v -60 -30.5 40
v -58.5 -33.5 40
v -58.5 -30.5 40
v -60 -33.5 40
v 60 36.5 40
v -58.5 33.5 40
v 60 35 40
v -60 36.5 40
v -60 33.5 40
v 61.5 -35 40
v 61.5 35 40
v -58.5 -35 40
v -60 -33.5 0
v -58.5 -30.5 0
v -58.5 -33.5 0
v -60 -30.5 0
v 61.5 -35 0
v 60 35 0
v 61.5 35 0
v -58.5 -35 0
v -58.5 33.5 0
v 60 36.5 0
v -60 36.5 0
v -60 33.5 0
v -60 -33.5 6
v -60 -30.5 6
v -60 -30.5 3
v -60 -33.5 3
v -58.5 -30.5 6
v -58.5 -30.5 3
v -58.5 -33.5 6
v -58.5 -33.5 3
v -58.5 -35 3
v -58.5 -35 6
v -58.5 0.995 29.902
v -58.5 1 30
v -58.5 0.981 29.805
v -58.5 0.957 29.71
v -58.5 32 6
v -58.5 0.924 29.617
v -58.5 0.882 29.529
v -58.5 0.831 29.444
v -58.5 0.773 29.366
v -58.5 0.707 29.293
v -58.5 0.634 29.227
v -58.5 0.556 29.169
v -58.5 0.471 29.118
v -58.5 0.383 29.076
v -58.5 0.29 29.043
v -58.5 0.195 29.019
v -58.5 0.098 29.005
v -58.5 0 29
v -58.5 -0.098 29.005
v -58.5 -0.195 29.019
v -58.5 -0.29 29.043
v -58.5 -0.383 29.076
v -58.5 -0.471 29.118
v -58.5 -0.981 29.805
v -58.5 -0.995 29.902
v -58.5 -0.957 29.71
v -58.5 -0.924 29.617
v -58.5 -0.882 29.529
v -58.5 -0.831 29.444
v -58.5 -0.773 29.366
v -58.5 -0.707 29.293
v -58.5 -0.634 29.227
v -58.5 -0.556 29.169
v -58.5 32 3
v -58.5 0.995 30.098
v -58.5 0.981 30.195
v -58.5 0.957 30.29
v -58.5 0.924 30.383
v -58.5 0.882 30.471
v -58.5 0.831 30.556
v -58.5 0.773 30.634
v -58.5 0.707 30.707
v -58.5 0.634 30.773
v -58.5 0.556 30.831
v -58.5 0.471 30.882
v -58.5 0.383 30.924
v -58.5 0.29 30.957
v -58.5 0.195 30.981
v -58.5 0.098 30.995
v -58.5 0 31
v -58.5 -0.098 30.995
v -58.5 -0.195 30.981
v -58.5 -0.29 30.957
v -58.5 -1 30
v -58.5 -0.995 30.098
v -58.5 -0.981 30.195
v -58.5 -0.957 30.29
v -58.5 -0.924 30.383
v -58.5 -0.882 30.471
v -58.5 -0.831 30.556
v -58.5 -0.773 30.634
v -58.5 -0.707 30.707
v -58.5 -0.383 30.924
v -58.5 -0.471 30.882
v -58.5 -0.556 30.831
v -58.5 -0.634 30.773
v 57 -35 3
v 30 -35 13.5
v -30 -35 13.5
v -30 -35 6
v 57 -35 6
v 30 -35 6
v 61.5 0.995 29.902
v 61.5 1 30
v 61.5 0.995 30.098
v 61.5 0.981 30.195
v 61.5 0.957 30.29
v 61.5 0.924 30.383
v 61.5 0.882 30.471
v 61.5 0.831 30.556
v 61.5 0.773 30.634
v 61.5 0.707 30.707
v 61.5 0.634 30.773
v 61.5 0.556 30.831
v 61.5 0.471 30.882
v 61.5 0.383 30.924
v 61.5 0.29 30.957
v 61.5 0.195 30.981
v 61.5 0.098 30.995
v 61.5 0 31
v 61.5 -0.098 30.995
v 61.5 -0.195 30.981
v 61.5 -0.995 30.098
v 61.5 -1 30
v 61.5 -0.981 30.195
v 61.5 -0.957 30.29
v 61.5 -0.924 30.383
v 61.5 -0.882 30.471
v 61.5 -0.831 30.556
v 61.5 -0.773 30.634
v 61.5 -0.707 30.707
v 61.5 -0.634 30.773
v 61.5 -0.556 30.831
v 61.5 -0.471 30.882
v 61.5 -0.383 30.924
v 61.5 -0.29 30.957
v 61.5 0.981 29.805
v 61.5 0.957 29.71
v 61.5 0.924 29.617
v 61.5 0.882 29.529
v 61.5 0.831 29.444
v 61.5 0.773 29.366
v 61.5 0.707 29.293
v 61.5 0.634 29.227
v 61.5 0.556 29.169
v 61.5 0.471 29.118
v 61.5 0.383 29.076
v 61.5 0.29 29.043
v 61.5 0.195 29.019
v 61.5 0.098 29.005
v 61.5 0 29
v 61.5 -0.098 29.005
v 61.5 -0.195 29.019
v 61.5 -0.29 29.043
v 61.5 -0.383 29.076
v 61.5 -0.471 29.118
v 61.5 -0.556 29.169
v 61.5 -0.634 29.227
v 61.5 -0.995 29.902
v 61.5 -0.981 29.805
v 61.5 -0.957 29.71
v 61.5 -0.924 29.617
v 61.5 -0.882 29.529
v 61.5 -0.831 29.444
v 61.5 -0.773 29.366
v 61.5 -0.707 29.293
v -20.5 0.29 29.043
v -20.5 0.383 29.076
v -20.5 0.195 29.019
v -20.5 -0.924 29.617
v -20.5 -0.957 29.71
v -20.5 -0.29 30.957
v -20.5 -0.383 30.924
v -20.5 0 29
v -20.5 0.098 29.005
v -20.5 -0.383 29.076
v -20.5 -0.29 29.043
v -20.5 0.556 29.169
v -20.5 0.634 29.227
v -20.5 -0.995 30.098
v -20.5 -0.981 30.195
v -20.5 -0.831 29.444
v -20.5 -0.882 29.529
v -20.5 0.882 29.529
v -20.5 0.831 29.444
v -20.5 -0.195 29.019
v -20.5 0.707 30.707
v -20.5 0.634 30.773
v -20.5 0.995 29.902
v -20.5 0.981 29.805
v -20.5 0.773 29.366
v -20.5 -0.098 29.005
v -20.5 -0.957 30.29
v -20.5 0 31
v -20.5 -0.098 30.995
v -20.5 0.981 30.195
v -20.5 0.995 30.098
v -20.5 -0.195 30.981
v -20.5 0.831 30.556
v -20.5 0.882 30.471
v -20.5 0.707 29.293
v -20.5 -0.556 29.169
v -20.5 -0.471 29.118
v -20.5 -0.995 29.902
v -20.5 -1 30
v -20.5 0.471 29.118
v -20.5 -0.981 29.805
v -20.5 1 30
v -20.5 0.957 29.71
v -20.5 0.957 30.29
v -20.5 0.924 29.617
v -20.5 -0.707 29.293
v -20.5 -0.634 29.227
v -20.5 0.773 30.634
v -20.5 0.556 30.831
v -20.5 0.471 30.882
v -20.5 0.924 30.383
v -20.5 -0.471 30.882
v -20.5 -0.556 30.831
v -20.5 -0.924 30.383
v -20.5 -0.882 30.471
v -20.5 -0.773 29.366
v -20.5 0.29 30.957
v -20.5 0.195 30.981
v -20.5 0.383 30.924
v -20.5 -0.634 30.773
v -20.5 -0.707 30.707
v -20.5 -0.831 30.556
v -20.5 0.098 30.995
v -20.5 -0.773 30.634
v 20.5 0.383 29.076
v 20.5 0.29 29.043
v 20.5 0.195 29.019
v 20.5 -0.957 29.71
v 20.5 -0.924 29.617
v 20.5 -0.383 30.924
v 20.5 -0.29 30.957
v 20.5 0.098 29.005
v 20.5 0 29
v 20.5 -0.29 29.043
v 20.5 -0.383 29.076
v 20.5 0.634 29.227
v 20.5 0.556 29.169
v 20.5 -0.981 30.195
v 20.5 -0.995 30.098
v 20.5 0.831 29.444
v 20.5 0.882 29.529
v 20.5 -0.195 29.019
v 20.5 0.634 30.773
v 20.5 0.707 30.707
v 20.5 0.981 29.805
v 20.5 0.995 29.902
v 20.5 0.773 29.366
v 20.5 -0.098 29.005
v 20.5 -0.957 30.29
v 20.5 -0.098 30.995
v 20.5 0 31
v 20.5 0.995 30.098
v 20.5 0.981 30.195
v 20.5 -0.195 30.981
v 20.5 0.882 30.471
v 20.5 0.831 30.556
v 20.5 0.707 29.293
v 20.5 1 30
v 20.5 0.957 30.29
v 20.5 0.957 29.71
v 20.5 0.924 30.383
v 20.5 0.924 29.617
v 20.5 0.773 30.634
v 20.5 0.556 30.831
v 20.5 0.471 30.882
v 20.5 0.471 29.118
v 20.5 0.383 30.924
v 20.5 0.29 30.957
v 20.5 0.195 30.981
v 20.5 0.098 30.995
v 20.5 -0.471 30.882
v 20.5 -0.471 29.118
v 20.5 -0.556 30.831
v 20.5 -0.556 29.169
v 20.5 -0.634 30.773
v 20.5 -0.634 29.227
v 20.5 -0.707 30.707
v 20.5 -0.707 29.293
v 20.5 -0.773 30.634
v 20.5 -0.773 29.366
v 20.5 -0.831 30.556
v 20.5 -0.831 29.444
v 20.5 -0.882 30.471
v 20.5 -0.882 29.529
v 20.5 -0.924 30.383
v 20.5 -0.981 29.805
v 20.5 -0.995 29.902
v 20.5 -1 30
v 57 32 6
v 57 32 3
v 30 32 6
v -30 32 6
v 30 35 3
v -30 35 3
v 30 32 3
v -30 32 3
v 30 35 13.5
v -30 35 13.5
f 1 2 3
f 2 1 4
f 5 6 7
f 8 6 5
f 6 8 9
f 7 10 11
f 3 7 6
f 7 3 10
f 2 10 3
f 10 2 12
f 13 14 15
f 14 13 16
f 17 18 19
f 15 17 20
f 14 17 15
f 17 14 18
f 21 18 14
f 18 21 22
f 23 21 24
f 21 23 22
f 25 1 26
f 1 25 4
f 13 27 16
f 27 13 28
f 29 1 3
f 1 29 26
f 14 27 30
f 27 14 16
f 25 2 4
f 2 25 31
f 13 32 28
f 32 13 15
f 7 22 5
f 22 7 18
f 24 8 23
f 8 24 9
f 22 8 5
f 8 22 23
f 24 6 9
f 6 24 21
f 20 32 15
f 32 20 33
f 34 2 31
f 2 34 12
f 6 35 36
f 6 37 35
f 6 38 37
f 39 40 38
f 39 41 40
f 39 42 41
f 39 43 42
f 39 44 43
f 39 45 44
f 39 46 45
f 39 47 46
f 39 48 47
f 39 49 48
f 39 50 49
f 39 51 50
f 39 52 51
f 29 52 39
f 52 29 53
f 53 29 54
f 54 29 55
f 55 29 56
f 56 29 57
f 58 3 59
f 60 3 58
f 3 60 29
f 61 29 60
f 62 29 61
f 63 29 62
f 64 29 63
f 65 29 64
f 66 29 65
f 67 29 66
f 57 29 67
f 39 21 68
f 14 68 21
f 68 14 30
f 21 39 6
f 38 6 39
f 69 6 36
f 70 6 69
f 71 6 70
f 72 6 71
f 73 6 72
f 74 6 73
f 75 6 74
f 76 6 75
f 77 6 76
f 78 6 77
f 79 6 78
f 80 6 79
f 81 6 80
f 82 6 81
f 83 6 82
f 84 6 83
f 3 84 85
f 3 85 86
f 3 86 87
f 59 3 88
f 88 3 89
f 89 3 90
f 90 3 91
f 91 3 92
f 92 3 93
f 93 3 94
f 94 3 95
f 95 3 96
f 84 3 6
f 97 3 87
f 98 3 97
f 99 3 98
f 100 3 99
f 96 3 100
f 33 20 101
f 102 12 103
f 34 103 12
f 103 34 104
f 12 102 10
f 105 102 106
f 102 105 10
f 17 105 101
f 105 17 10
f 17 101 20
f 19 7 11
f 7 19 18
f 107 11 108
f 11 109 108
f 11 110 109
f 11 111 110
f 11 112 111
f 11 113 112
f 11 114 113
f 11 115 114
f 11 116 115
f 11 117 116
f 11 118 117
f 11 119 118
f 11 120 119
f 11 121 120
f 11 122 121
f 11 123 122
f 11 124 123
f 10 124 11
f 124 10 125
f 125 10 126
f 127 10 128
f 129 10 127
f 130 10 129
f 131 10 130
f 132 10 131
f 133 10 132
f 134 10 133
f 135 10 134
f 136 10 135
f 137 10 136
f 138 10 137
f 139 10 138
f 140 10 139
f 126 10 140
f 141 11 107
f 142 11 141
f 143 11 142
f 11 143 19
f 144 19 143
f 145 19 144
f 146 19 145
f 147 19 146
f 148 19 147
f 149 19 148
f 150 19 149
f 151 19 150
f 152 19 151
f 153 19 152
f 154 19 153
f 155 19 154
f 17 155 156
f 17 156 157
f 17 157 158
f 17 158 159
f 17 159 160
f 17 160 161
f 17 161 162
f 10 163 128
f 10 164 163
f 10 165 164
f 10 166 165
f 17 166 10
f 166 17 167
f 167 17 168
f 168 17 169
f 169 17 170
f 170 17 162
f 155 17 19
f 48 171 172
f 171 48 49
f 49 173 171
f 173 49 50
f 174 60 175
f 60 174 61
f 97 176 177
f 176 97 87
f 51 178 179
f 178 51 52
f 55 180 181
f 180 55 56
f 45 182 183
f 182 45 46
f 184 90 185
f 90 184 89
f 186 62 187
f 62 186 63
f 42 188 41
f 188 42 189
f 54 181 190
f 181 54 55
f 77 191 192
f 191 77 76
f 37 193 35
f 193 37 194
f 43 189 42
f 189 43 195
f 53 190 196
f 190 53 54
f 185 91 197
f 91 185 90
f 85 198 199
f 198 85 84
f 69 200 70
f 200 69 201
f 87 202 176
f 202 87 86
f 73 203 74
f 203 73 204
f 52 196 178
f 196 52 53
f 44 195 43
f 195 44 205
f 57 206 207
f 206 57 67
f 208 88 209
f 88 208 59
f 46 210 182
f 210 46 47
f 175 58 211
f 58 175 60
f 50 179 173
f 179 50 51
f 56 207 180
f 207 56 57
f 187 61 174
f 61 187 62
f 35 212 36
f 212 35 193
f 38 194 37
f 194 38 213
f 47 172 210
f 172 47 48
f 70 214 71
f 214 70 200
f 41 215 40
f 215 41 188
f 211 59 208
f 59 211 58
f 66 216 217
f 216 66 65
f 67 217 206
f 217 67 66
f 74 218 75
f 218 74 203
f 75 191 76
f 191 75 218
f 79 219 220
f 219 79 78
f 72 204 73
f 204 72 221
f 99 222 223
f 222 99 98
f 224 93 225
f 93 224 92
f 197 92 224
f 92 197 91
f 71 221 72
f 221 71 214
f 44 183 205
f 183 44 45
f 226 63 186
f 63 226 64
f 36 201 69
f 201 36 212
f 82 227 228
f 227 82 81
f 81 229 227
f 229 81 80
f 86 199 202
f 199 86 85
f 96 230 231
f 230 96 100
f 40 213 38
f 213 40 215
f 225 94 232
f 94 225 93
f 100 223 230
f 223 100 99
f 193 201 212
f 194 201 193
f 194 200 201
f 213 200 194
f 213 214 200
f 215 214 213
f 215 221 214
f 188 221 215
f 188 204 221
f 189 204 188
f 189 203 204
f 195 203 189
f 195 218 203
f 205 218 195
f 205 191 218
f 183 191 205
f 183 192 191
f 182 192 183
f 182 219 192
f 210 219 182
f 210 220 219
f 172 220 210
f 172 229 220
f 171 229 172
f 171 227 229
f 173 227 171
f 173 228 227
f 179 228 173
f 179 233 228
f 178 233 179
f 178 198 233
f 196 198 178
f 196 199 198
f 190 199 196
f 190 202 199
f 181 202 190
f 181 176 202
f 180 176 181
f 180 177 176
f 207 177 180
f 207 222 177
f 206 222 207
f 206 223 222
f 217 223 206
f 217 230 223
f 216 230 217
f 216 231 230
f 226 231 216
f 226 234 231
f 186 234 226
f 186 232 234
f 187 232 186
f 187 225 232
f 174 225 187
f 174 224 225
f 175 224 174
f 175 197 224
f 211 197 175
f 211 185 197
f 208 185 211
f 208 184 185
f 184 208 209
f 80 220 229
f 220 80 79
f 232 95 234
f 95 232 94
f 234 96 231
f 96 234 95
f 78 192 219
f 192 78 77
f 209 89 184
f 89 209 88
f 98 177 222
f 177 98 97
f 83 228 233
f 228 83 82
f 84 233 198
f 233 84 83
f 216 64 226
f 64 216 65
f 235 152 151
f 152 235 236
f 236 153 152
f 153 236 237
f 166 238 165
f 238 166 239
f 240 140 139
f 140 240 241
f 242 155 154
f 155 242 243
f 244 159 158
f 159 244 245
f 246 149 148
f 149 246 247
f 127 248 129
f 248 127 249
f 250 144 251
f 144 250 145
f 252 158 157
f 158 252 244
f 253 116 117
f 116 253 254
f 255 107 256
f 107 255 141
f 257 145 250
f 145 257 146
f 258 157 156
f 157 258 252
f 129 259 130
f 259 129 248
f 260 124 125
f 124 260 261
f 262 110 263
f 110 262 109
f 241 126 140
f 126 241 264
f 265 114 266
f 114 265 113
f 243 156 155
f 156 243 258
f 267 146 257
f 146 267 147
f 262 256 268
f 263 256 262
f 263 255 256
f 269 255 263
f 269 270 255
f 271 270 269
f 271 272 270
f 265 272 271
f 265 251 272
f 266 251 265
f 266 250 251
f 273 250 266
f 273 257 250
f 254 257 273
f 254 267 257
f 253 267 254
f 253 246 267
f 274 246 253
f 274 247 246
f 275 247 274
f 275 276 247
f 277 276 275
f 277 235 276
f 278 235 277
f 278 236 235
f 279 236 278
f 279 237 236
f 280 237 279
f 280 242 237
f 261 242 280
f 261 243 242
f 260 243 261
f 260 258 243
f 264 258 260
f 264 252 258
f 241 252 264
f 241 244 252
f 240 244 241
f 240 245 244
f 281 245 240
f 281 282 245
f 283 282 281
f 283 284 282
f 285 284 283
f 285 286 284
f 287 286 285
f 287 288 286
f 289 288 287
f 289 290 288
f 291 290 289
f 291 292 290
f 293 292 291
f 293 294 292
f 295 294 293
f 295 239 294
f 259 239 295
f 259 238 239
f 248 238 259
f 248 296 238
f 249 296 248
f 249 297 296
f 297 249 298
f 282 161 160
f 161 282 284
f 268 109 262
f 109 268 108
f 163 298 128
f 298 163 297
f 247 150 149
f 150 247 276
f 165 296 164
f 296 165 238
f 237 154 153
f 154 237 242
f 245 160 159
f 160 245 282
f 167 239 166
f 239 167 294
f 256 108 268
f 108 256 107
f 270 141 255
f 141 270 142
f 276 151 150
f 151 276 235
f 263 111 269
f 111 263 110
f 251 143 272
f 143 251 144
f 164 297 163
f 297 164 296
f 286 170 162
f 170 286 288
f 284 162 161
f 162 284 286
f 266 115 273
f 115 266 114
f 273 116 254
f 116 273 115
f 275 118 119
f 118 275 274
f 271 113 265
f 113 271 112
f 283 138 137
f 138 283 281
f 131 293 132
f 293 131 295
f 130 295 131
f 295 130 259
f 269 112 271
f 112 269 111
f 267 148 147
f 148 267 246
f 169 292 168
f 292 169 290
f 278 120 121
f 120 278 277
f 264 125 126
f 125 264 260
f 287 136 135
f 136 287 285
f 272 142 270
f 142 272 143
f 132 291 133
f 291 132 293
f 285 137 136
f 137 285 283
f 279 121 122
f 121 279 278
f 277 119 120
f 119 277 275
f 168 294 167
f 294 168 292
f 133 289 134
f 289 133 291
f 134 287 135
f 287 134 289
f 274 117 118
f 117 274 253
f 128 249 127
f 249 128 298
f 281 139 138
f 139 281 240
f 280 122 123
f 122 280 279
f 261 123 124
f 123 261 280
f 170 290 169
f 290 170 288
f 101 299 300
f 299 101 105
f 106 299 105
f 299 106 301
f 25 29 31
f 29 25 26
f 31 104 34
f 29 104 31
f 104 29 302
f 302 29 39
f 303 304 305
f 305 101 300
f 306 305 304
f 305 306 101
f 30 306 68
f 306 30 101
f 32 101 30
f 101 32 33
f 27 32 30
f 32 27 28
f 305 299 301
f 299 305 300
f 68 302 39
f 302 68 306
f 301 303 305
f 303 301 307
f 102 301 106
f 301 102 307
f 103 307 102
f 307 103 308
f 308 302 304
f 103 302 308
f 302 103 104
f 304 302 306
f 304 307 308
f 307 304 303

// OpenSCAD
// Mini horizontal gel-electrophoresis buffer tank
// Print orientation: base on XY plane, open top facing +Z

$fn = 64;

// --- Tank dimensions ---
tank_x = 120;   // outer length (X)
tank_y = 70;    // outer width (Y)
tank_z = 40;    // outer height (Z)

// --- Walls and floor ---
wall = 3;       // wall thickness
floor = 3;      // floor thickness

// --- Gel tray platform ---
plat_x = 60;    // platform length in X
plat_top_z = 13; // top of platform (10 mm above inner floor)

// --- Electrode holes ---
hole_d = 2;     // hole diameter
hole_y = 0;     // hole Y position
hole_z = 30;    // hole Z position

// --- Cutting overlap ---
eps = 0.5;      // extension past cut faces

difference() {
    // Tank body
    union() {
        // Side walls and floor
        hull() {
            for (sx = [-1, 1]) {
                translate([sx * (tank_x / 2 - wall / 2), -tank_y / 2, 0])
                    cube([wall, tank_y, tank_z]);
            }
        }
        // End walls (overlap into side walls for a clean union)
        for (sy = [-1, 1])
            translate([-tank_x / 2, sy * (tank_y / 2 - wall / 2), 0])
                cube([tank_x, wall, tank_z]);
    }

    // Floor cavity
    translate([-tank_x / 2, -tank_y / 2, floor])
        cube([tank_x - wall, tank_y - wall, floor]);

    // Gel tray platform
    translate([-plat_x / 2, -tank_y / 2, plat_top_z - 10])
        cube([plat_x, tank_y, 10 + eps]);

    // Electrode holes through end walls
    for (x = [-tank_x / 2 + wall / 2, tank_x / 2 - wall / 2])
        translate([x, hole_y, hole_z])
            rotate([0, 90, 0])
                cylinder(d = hole_d, h = tank_y + 2 * wall, center = true);
}
